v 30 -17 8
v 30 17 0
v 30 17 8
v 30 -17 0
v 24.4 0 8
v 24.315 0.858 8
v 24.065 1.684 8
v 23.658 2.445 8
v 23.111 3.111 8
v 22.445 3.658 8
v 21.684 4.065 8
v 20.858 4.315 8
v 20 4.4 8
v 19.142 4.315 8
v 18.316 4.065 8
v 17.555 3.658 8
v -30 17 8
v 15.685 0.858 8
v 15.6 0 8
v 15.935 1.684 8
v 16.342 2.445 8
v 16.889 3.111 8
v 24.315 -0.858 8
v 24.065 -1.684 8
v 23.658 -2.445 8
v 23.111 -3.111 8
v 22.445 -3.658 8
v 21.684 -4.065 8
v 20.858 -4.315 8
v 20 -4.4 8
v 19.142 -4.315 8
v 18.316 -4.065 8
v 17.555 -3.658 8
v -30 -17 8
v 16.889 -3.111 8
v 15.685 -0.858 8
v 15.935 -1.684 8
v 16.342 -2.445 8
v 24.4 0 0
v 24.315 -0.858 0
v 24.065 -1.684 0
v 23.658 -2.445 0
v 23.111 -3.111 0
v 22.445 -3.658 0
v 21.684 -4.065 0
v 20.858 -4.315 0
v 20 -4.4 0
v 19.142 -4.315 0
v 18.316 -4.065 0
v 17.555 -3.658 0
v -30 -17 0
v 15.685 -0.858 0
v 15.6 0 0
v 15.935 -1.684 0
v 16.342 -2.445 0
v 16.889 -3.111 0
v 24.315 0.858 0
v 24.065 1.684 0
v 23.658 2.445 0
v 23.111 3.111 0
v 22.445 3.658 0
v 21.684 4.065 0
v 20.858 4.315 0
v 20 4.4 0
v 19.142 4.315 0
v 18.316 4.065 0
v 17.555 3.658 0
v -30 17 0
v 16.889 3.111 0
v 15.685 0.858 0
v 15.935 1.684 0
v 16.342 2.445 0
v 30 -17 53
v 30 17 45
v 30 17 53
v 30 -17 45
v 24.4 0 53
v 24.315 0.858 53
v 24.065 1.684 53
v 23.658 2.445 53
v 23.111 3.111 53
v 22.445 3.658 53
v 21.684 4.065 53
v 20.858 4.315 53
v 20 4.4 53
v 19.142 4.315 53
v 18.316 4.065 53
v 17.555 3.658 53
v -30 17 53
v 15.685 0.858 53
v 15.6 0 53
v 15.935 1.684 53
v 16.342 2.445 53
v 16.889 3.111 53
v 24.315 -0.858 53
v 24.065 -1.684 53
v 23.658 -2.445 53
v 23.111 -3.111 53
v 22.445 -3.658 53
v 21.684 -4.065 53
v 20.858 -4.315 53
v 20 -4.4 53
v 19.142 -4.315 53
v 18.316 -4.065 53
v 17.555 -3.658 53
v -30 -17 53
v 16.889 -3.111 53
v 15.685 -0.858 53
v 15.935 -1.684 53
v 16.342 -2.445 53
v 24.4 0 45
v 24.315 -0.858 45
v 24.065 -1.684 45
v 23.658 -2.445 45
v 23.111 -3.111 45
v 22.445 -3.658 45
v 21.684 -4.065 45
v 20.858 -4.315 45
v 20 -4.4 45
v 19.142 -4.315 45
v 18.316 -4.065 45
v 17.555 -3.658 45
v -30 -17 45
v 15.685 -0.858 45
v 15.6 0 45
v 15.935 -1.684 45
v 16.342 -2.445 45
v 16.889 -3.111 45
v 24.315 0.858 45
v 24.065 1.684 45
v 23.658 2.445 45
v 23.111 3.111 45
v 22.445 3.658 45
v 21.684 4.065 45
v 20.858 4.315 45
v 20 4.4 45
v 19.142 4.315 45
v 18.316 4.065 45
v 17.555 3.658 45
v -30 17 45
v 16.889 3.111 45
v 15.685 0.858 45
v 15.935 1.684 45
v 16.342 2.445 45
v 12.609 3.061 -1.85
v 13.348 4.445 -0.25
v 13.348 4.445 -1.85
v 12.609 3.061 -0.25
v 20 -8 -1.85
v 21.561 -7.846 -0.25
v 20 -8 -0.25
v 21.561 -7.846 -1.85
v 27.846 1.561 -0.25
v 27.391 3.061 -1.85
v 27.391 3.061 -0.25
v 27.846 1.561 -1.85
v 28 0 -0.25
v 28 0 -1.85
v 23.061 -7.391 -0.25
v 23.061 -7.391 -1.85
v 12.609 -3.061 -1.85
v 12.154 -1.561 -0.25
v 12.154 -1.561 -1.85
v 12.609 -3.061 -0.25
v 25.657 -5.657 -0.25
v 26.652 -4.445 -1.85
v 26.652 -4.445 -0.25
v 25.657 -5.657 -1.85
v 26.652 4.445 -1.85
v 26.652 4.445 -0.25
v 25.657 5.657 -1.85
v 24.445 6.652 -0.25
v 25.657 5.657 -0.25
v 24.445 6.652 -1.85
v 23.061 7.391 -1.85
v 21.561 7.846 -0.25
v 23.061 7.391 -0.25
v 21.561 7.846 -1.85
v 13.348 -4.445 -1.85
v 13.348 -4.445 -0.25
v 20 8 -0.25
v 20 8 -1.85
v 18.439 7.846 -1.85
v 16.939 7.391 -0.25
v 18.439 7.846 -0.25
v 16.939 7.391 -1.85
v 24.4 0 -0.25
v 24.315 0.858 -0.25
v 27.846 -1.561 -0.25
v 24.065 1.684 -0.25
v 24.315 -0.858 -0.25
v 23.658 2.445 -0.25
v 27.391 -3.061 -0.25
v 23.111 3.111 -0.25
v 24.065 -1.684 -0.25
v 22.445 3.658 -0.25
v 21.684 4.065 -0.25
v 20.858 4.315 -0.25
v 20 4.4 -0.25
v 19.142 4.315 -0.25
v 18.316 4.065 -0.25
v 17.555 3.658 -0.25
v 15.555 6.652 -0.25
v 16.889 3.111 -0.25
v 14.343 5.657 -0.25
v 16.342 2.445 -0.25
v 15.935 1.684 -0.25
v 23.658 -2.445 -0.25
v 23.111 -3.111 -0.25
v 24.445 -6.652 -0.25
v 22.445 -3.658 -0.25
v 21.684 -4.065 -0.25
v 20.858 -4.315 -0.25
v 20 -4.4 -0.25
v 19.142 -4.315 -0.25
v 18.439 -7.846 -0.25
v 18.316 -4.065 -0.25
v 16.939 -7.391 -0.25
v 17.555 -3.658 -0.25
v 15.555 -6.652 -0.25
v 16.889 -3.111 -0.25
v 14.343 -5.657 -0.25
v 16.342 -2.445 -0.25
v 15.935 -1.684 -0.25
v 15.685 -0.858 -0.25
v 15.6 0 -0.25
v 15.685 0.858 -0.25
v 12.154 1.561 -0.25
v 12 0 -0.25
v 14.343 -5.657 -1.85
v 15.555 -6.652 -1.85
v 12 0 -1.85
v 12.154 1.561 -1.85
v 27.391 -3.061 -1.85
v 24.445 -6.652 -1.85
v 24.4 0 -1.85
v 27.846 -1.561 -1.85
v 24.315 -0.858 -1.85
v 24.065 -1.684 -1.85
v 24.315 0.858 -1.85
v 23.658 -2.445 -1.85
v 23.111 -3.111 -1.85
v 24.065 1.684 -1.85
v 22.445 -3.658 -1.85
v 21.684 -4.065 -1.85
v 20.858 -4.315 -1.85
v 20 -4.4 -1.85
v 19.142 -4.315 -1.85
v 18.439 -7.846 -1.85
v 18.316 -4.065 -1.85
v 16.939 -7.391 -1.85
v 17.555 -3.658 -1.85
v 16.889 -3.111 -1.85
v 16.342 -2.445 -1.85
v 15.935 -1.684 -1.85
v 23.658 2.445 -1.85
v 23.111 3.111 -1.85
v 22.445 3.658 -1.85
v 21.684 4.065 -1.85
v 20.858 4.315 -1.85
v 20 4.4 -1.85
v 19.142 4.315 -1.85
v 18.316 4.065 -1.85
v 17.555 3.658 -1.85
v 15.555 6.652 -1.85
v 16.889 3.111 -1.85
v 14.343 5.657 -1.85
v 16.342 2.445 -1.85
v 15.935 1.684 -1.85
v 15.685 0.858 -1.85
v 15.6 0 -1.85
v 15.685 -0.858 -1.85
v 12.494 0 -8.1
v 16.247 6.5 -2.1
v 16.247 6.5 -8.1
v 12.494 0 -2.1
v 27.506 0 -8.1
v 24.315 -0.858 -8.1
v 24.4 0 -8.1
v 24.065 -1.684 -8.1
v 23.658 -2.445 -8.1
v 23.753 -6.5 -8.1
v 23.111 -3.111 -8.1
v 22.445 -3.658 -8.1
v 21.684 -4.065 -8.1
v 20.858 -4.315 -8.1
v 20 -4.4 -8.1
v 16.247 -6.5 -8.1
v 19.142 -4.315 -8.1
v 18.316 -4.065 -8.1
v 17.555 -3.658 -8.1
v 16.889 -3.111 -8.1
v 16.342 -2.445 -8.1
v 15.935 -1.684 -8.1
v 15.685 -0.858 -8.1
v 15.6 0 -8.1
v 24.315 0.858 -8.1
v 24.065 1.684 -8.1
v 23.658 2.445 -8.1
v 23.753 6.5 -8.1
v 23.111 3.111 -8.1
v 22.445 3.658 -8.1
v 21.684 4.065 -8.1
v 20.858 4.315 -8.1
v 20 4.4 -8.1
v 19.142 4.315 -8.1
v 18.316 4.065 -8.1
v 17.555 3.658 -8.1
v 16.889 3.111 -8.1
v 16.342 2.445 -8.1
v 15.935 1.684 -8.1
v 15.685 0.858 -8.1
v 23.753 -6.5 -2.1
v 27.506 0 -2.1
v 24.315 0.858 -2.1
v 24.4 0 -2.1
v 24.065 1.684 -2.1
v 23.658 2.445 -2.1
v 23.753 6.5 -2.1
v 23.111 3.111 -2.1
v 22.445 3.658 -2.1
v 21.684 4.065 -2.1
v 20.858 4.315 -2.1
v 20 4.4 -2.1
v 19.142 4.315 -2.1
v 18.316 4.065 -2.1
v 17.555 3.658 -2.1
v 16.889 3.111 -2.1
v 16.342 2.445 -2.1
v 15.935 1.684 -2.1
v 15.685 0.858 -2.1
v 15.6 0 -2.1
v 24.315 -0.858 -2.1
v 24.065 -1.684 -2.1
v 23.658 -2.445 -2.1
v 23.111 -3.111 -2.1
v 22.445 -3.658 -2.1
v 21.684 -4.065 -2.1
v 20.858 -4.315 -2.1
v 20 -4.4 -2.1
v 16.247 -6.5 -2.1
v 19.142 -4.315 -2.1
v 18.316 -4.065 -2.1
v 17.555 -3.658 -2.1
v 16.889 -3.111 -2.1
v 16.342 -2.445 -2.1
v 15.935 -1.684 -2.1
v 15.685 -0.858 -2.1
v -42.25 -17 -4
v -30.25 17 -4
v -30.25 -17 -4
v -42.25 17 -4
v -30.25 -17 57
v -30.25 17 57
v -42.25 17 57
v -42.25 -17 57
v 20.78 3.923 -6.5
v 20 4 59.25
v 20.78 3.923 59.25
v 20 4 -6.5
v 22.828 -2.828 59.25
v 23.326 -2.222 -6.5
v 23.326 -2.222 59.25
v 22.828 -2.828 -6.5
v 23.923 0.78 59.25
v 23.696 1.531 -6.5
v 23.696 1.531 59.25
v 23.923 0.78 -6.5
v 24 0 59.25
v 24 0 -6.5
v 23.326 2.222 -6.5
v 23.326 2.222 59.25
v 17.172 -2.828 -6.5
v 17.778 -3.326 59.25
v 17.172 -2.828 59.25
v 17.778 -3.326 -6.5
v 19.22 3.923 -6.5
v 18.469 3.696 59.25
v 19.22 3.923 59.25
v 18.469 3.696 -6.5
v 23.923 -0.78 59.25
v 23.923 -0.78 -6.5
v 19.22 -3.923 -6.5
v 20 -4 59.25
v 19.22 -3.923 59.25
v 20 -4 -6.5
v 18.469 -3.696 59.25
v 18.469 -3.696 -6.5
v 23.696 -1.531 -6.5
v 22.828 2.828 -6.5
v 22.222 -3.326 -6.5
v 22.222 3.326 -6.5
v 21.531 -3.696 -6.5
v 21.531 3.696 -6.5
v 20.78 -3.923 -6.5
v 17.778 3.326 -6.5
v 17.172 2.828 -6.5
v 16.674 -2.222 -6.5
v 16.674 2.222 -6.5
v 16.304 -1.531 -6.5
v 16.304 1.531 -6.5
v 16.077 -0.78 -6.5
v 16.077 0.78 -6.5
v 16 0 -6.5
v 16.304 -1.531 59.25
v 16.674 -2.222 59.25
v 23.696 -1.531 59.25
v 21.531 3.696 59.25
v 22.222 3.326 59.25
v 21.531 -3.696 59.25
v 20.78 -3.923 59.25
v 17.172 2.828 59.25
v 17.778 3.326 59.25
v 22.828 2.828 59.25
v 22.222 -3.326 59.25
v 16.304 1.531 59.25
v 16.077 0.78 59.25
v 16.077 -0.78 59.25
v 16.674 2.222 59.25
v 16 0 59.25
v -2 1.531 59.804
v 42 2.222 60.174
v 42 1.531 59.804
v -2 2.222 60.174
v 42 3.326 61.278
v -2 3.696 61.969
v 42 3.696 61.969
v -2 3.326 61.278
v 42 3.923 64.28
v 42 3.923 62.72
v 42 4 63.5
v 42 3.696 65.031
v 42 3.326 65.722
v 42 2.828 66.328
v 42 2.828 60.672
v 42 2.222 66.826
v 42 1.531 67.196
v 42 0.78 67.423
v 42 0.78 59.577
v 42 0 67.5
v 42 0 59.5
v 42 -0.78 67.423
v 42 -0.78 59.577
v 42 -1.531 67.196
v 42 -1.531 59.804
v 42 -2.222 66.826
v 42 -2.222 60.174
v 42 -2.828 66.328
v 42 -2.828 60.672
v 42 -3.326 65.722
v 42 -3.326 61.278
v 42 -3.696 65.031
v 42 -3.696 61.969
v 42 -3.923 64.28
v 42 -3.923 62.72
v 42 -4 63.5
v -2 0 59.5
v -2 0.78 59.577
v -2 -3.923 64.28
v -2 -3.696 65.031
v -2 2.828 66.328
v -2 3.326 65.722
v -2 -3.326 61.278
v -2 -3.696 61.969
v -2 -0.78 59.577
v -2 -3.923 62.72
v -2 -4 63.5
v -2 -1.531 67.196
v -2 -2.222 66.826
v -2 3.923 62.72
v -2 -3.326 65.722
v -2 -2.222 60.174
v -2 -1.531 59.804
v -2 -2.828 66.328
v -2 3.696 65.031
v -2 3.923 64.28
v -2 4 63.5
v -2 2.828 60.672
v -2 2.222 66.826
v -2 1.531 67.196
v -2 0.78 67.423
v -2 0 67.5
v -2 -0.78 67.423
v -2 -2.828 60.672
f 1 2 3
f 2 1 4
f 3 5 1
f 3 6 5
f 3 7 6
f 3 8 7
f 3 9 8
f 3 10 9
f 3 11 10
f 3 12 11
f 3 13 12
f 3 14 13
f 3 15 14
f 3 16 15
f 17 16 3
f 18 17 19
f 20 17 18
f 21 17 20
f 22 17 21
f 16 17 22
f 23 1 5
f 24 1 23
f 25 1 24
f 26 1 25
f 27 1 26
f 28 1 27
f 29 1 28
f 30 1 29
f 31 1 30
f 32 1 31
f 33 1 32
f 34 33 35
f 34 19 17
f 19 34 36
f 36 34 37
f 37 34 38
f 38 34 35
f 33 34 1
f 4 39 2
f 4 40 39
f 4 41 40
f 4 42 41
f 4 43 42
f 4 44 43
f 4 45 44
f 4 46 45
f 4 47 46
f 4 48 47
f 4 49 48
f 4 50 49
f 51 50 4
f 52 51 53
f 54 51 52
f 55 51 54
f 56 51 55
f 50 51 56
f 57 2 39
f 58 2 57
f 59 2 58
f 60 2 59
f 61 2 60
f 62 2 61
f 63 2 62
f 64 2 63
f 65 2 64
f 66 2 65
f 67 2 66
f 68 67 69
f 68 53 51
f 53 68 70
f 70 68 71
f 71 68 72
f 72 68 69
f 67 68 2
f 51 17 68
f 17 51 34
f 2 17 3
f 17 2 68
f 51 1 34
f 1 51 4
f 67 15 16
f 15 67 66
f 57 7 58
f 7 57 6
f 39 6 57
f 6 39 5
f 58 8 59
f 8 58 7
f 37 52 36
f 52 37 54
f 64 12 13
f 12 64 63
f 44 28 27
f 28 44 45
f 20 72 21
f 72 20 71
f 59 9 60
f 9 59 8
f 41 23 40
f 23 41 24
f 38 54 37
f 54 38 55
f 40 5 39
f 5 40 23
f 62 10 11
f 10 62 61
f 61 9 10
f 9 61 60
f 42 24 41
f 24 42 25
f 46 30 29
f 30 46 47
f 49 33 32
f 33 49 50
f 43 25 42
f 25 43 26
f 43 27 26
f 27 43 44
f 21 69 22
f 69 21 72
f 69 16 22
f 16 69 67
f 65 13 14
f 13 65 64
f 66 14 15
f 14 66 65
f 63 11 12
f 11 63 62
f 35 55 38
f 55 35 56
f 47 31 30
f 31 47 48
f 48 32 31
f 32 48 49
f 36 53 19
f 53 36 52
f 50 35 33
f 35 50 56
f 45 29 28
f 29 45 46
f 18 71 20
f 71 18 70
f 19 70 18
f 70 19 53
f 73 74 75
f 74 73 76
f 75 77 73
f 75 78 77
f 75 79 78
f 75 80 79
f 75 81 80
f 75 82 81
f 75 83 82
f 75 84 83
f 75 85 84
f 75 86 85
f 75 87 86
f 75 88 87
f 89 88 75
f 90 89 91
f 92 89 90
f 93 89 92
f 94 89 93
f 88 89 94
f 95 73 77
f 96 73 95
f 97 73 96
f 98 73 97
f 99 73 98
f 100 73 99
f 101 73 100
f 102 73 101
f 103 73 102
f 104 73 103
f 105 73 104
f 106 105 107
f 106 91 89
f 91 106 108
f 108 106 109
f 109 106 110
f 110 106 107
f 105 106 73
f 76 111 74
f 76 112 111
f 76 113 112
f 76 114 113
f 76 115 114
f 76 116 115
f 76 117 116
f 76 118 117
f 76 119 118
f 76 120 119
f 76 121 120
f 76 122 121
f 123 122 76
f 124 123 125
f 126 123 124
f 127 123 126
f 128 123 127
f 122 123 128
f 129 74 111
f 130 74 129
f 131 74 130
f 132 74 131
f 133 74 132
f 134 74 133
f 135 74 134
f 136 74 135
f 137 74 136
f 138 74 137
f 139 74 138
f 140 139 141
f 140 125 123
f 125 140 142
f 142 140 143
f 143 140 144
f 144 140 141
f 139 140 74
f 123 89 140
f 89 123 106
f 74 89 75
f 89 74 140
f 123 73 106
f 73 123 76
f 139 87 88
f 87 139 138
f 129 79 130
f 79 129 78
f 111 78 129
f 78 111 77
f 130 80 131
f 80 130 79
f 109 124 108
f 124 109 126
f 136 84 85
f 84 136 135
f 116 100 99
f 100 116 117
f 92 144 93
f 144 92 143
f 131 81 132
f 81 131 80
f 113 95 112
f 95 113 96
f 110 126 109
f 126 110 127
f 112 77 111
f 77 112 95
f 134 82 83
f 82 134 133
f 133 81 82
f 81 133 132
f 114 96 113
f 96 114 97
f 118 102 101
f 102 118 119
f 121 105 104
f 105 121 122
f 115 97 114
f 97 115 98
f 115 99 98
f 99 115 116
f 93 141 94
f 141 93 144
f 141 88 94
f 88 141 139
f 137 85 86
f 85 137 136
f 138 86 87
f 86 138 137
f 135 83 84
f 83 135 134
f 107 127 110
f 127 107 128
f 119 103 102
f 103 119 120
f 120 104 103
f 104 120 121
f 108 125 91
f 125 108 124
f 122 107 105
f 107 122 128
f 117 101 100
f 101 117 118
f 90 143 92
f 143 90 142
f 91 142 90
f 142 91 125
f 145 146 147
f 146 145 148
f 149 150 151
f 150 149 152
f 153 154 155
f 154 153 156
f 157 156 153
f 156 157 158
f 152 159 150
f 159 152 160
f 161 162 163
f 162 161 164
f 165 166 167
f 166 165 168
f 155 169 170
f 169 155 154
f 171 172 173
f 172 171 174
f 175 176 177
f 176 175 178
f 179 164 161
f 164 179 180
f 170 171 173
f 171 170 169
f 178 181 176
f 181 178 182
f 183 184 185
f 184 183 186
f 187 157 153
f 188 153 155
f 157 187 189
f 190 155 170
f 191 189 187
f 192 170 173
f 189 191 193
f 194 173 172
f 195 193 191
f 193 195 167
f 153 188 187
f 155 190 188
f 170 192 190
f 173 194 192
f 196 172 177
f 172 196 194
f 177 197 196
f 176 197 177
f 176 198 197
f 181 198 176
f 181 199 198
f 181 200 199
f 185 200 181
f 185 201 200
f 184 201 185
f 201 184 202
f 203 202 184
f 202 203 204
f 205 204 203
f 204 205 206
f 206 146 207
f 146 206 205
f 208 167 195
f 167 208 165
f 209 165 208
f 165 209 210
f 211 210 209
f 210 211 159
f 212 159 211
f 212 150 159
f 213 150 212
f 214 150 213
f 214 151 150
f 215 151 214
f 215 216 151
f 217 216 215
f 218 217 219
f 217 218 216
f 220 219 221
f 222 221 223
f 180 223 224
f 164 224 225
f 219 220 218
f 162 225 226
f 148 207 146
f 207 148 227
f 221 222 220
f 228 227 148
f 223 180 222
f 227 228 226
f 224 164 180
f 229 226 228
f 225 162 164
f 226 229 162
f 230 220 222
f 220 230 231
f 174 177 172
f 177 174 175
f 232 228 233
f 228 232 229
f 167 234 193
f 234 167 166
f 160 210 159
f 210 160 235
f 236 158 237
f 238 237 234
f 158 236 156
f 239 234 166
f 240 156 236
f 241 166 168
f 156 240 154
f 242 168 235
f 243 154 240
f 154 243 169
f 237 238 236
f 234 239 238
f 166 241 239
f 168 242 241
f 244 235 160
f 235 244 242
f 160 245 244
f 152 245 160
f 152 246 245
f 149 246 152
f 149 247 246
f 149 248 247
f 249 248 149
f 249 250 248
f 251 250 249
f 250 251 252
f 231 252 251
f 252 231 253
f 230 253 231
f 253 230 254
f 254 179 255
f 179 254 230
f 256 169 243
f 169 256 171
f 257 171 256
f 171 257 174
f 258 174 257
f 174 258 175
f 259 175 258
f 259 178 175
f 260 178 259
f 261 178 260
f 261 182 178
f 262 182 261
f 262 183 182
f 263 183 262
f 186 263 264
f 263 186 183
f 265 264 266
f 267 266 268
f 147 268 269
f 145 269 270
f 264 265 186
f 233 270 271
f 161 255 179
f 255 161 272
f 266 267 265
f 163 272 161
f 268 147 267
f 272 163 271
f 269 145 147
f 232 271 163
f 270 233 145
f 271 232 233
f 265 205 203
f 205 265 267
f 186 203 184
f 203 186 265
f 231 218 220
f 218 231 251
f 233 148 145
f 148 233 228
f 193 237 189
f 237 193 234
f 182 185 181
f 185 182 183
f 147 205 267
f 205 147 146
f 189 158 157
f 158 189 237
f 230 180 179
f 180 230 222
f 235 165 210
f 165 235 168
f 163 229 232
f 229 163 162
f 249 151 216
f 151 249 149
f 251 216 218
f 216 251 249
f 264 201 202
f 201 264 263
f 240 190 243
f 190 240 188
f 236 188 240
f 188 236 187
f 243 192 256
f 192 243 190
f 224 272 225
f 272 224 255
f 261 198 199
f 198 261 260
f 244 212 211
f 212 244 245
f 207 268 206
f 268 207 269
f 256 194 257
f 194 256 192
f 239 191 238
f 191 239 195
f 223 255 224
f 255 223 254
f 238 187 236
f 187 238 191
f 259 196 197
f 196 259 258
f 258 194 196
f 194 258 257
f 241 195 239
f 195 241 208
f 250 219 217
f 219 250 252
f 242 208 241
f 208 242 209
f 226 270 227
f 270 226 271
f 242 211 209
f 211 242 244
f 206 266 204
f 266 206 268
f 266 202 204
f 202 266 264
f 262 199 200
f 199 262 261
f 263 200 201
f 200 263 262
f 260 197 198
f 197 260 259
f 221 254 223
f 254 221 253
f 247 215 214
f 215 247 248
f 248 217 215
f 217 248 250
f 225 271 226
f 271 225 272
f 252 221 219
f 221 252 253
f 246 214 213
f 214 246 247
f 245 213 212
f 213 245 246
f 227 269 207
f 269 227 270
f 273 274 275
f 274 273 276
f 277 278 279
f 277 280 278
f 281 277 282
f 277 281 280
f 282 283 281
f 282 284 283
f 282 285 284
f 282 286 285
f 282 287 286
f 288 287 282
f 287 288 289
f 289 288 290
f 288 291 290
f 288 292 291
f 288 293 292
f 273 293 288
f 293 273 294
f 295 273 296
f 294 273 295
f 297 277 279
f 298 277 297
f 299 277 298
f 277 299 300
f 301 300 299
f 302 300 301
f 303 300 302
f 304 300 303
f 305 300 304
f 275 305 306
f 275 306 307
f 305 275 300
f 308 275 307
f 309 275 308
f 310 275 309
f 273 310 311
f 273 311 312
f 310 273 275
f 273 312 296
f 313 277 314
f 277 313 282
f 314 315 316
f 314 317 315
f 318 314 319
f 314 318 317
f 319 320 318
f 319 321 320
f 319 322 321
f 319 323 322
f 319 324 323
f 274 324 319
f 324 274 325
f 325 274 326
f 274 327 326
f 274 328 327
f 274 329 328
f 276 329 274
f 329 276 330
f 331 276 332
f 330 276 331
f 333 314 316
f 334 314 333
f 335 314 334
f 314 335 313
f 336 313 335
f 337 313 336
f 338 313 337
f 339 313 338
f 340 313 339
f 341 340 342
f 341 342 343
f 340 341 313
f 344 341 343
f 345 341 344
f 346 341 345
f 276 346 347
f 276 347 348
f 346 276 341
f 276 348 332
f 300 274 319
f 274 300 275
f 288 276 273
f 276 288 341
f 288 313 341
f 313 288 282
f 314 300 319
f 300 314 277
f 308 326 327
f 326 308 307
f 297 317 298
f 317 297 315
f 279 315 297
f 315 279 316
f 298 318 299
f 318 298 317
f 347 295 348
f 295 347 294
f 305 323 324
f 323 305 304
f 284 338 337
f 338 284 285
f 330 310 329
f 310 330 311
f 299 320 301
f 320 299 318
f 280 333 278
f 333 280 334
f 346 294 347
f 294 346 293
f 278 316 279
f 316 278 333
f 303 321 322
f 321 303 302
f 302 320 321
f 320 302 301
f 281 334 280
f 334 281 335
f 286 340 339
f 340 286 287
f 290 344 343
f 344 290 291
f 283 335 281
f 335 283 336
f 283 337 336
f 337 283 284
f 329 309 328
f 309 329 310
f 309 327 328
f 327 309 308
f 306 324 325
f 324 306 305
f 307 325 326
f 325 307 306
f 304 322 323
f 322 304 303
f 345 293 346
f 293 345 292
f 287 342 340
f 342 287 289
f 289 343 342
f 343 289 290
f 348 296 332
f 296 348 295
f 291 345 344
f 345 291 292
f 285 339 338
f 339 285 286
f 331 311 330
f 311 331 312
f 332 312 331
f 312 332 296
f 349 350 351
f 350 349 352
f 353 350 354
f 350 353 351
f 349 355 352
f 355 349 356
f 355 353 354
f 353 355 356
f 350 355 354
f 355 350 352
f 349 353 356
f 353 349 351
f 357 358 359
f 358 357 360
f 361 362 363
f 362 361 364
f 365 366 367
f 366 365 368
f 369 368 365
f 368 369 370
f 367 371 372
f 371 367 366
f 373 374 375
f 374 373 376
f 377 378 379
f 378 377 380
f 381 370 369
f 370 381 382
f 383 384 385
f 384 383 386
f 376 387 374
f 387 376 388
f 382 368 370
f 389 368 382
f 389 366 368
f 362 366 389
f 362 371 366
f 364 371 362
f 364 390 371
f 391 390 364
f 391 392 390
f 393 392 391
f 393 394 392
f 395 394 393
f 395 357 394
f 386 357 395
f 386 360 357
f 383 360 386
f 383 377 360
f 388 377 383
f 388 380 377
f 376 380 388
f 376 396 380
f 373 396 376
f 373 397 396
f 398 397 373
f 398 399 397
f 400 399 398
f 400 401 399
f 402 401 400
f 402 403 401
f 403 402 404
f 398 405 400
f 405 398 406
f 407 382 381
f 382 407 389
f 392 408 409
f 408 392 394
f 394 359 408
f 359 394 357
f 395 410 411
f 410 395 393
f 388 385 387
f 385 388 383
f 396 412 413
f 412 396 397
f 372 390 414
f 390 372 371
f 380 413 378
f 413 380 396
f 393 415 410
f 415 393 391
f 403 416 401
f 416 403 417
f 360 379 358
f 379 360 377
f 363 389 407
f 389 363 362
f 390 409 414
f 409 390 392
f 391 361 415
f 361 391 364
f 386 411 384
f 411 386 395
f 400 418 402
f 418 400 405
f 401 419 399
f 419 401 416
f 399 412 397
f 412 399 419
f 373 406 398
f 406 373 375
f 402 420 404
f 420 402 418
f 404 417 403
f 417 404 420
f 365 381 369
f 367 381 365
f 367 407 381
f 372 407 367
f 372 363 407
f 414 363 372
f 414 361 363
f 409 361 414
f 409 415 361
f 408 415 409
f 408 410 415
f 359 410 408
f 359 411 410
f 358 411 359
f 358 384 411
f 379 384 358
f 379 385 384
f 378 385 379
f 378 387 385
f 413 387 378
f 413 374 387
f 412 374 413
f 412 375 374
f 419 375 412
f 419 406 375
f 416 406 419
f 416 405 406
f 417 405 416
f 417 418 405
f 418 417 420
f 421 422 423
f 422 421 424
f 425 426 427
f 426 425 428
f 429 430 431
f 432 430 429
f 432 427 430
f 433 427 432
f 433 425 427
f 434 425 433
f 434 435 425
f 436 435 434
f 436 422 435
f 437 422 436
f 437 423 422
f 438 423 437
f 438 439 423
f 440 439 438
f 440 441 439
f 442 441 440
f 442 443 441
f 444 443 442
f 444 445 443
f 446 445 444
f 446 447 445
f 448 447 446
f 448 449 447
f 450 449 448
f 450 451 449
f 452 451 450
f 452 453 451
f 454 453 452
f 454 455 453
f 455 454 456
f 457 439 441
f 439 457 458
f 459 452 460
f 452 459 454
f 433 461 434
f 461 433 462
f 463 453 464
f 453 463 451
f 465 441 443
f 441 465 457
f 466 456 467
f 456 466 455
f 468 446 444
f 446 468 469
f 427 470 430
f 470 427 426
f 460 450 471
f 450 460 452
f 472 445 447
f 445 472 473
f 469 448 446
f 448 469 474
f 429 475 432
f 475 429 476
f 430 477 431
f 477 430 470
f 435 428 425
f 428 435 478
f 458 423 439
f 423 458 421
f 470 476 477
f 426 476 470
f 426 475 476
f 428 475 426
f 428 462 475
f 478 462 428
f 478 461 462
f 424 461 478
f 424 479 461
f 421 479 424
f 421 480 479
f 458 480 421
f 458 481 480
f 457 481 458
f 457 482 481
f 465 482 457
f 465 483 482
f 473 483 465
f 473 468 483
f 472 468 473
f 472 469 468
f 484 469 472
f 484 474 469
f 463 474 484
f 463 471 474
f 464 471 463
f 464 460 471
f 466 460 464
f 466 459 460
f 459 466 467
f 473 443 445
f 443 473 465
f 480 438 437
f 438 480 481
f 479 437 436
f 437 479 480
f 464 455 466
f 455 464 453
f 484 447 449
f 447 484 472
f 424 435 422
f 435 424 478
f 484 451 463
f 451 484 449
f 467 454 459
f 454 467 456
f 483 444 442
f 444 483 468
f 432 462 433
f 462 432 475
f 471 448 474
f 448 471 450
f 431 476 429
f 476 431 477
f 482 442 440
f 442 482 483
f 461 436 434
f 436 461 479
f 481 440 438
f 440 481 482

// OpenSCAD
$fn = 32;

// ------------------------------------------------------------------------
// C clamp: throat 45 mm, screw d8
// Every part is its own module, assembly() places every instance.
// ------------------------------------------------------------------------

// --- part 1 ---
module clamp_arm() {
  difference() {
    translate([-30, -17, 0]) cube([60, 34, 8]);
    translate([20, 0, -1]) cylinder(h = 10, d = 8.8);
  }
}

// --- part 2 ---
module clamp_spine() {
  difference() {
    translate([-30.5, -17, 0]) cube([61, 34, 12]);
  }
}

// --- part 3 ---
module clamp_screw() {
  translate([0, 0, -32.875]) cylinder(h = 65.75, d = 8);
}

// --- part 4 ---
module clamp_washer() {
  difference() {
      translate([0, 0, 0]) cylinder(h = 1.6, d = 16);
      translate([0, 0, -1]) cylinder(h = 3.6, d = 8.8);
    }
}

// --- part 5 ---
module clamp_nut() {
  difference() {
    linear_extrude(height = 6) polygon(points = [[7.506, 0], [3.753, 6.5], [-3.753, 6.5], [-7.506, 0], [-3.753, -6.5], [3.753, -6.5]]);
    translate([0, 0, -1]) cylinder(h = 8, d = 8.8);
  }
}

// --- part 6 ---
module tommy_bar() {
  translate([0, 0, -22]) cylinder(h = 44, d = 8);
}

// --- assembly ---
module assembly() {
  color([0.80, 0.24, 0.20]) translate([0, 0, 0]) rotate([0, 0, 0]) clamp_arm();
  color([0.20, 0.45, 0.75]) translate([0, 0, 45]) rotate([0, 0, 0]) clamp_arm();
  color([0.25, 0.62, 0.32]) translate([-42.25, 0, 26.5]) rotate([0, 90, 0]) clamp_spine();
  color([0.92, 0.70, 0.18]) translate([20, 0, 26.375]) rotate([0, 0, 0]) clamp_screw();
  color([0.58, 0.35, 0.70]) translate([20, 0, -1.85]) rotate([0, 0, 0]) clamp_washer();
  color([0.16, 0.66, 0.66]) translate([20, 0, -8.1]) rotate([0, 0, 0]) clamp_nut();
  color([0.85, 0.48, 0.18]) translate([20, 0, 63.5]) rotate([0, 90, 0]) tommy_bar();
}

assembly();
